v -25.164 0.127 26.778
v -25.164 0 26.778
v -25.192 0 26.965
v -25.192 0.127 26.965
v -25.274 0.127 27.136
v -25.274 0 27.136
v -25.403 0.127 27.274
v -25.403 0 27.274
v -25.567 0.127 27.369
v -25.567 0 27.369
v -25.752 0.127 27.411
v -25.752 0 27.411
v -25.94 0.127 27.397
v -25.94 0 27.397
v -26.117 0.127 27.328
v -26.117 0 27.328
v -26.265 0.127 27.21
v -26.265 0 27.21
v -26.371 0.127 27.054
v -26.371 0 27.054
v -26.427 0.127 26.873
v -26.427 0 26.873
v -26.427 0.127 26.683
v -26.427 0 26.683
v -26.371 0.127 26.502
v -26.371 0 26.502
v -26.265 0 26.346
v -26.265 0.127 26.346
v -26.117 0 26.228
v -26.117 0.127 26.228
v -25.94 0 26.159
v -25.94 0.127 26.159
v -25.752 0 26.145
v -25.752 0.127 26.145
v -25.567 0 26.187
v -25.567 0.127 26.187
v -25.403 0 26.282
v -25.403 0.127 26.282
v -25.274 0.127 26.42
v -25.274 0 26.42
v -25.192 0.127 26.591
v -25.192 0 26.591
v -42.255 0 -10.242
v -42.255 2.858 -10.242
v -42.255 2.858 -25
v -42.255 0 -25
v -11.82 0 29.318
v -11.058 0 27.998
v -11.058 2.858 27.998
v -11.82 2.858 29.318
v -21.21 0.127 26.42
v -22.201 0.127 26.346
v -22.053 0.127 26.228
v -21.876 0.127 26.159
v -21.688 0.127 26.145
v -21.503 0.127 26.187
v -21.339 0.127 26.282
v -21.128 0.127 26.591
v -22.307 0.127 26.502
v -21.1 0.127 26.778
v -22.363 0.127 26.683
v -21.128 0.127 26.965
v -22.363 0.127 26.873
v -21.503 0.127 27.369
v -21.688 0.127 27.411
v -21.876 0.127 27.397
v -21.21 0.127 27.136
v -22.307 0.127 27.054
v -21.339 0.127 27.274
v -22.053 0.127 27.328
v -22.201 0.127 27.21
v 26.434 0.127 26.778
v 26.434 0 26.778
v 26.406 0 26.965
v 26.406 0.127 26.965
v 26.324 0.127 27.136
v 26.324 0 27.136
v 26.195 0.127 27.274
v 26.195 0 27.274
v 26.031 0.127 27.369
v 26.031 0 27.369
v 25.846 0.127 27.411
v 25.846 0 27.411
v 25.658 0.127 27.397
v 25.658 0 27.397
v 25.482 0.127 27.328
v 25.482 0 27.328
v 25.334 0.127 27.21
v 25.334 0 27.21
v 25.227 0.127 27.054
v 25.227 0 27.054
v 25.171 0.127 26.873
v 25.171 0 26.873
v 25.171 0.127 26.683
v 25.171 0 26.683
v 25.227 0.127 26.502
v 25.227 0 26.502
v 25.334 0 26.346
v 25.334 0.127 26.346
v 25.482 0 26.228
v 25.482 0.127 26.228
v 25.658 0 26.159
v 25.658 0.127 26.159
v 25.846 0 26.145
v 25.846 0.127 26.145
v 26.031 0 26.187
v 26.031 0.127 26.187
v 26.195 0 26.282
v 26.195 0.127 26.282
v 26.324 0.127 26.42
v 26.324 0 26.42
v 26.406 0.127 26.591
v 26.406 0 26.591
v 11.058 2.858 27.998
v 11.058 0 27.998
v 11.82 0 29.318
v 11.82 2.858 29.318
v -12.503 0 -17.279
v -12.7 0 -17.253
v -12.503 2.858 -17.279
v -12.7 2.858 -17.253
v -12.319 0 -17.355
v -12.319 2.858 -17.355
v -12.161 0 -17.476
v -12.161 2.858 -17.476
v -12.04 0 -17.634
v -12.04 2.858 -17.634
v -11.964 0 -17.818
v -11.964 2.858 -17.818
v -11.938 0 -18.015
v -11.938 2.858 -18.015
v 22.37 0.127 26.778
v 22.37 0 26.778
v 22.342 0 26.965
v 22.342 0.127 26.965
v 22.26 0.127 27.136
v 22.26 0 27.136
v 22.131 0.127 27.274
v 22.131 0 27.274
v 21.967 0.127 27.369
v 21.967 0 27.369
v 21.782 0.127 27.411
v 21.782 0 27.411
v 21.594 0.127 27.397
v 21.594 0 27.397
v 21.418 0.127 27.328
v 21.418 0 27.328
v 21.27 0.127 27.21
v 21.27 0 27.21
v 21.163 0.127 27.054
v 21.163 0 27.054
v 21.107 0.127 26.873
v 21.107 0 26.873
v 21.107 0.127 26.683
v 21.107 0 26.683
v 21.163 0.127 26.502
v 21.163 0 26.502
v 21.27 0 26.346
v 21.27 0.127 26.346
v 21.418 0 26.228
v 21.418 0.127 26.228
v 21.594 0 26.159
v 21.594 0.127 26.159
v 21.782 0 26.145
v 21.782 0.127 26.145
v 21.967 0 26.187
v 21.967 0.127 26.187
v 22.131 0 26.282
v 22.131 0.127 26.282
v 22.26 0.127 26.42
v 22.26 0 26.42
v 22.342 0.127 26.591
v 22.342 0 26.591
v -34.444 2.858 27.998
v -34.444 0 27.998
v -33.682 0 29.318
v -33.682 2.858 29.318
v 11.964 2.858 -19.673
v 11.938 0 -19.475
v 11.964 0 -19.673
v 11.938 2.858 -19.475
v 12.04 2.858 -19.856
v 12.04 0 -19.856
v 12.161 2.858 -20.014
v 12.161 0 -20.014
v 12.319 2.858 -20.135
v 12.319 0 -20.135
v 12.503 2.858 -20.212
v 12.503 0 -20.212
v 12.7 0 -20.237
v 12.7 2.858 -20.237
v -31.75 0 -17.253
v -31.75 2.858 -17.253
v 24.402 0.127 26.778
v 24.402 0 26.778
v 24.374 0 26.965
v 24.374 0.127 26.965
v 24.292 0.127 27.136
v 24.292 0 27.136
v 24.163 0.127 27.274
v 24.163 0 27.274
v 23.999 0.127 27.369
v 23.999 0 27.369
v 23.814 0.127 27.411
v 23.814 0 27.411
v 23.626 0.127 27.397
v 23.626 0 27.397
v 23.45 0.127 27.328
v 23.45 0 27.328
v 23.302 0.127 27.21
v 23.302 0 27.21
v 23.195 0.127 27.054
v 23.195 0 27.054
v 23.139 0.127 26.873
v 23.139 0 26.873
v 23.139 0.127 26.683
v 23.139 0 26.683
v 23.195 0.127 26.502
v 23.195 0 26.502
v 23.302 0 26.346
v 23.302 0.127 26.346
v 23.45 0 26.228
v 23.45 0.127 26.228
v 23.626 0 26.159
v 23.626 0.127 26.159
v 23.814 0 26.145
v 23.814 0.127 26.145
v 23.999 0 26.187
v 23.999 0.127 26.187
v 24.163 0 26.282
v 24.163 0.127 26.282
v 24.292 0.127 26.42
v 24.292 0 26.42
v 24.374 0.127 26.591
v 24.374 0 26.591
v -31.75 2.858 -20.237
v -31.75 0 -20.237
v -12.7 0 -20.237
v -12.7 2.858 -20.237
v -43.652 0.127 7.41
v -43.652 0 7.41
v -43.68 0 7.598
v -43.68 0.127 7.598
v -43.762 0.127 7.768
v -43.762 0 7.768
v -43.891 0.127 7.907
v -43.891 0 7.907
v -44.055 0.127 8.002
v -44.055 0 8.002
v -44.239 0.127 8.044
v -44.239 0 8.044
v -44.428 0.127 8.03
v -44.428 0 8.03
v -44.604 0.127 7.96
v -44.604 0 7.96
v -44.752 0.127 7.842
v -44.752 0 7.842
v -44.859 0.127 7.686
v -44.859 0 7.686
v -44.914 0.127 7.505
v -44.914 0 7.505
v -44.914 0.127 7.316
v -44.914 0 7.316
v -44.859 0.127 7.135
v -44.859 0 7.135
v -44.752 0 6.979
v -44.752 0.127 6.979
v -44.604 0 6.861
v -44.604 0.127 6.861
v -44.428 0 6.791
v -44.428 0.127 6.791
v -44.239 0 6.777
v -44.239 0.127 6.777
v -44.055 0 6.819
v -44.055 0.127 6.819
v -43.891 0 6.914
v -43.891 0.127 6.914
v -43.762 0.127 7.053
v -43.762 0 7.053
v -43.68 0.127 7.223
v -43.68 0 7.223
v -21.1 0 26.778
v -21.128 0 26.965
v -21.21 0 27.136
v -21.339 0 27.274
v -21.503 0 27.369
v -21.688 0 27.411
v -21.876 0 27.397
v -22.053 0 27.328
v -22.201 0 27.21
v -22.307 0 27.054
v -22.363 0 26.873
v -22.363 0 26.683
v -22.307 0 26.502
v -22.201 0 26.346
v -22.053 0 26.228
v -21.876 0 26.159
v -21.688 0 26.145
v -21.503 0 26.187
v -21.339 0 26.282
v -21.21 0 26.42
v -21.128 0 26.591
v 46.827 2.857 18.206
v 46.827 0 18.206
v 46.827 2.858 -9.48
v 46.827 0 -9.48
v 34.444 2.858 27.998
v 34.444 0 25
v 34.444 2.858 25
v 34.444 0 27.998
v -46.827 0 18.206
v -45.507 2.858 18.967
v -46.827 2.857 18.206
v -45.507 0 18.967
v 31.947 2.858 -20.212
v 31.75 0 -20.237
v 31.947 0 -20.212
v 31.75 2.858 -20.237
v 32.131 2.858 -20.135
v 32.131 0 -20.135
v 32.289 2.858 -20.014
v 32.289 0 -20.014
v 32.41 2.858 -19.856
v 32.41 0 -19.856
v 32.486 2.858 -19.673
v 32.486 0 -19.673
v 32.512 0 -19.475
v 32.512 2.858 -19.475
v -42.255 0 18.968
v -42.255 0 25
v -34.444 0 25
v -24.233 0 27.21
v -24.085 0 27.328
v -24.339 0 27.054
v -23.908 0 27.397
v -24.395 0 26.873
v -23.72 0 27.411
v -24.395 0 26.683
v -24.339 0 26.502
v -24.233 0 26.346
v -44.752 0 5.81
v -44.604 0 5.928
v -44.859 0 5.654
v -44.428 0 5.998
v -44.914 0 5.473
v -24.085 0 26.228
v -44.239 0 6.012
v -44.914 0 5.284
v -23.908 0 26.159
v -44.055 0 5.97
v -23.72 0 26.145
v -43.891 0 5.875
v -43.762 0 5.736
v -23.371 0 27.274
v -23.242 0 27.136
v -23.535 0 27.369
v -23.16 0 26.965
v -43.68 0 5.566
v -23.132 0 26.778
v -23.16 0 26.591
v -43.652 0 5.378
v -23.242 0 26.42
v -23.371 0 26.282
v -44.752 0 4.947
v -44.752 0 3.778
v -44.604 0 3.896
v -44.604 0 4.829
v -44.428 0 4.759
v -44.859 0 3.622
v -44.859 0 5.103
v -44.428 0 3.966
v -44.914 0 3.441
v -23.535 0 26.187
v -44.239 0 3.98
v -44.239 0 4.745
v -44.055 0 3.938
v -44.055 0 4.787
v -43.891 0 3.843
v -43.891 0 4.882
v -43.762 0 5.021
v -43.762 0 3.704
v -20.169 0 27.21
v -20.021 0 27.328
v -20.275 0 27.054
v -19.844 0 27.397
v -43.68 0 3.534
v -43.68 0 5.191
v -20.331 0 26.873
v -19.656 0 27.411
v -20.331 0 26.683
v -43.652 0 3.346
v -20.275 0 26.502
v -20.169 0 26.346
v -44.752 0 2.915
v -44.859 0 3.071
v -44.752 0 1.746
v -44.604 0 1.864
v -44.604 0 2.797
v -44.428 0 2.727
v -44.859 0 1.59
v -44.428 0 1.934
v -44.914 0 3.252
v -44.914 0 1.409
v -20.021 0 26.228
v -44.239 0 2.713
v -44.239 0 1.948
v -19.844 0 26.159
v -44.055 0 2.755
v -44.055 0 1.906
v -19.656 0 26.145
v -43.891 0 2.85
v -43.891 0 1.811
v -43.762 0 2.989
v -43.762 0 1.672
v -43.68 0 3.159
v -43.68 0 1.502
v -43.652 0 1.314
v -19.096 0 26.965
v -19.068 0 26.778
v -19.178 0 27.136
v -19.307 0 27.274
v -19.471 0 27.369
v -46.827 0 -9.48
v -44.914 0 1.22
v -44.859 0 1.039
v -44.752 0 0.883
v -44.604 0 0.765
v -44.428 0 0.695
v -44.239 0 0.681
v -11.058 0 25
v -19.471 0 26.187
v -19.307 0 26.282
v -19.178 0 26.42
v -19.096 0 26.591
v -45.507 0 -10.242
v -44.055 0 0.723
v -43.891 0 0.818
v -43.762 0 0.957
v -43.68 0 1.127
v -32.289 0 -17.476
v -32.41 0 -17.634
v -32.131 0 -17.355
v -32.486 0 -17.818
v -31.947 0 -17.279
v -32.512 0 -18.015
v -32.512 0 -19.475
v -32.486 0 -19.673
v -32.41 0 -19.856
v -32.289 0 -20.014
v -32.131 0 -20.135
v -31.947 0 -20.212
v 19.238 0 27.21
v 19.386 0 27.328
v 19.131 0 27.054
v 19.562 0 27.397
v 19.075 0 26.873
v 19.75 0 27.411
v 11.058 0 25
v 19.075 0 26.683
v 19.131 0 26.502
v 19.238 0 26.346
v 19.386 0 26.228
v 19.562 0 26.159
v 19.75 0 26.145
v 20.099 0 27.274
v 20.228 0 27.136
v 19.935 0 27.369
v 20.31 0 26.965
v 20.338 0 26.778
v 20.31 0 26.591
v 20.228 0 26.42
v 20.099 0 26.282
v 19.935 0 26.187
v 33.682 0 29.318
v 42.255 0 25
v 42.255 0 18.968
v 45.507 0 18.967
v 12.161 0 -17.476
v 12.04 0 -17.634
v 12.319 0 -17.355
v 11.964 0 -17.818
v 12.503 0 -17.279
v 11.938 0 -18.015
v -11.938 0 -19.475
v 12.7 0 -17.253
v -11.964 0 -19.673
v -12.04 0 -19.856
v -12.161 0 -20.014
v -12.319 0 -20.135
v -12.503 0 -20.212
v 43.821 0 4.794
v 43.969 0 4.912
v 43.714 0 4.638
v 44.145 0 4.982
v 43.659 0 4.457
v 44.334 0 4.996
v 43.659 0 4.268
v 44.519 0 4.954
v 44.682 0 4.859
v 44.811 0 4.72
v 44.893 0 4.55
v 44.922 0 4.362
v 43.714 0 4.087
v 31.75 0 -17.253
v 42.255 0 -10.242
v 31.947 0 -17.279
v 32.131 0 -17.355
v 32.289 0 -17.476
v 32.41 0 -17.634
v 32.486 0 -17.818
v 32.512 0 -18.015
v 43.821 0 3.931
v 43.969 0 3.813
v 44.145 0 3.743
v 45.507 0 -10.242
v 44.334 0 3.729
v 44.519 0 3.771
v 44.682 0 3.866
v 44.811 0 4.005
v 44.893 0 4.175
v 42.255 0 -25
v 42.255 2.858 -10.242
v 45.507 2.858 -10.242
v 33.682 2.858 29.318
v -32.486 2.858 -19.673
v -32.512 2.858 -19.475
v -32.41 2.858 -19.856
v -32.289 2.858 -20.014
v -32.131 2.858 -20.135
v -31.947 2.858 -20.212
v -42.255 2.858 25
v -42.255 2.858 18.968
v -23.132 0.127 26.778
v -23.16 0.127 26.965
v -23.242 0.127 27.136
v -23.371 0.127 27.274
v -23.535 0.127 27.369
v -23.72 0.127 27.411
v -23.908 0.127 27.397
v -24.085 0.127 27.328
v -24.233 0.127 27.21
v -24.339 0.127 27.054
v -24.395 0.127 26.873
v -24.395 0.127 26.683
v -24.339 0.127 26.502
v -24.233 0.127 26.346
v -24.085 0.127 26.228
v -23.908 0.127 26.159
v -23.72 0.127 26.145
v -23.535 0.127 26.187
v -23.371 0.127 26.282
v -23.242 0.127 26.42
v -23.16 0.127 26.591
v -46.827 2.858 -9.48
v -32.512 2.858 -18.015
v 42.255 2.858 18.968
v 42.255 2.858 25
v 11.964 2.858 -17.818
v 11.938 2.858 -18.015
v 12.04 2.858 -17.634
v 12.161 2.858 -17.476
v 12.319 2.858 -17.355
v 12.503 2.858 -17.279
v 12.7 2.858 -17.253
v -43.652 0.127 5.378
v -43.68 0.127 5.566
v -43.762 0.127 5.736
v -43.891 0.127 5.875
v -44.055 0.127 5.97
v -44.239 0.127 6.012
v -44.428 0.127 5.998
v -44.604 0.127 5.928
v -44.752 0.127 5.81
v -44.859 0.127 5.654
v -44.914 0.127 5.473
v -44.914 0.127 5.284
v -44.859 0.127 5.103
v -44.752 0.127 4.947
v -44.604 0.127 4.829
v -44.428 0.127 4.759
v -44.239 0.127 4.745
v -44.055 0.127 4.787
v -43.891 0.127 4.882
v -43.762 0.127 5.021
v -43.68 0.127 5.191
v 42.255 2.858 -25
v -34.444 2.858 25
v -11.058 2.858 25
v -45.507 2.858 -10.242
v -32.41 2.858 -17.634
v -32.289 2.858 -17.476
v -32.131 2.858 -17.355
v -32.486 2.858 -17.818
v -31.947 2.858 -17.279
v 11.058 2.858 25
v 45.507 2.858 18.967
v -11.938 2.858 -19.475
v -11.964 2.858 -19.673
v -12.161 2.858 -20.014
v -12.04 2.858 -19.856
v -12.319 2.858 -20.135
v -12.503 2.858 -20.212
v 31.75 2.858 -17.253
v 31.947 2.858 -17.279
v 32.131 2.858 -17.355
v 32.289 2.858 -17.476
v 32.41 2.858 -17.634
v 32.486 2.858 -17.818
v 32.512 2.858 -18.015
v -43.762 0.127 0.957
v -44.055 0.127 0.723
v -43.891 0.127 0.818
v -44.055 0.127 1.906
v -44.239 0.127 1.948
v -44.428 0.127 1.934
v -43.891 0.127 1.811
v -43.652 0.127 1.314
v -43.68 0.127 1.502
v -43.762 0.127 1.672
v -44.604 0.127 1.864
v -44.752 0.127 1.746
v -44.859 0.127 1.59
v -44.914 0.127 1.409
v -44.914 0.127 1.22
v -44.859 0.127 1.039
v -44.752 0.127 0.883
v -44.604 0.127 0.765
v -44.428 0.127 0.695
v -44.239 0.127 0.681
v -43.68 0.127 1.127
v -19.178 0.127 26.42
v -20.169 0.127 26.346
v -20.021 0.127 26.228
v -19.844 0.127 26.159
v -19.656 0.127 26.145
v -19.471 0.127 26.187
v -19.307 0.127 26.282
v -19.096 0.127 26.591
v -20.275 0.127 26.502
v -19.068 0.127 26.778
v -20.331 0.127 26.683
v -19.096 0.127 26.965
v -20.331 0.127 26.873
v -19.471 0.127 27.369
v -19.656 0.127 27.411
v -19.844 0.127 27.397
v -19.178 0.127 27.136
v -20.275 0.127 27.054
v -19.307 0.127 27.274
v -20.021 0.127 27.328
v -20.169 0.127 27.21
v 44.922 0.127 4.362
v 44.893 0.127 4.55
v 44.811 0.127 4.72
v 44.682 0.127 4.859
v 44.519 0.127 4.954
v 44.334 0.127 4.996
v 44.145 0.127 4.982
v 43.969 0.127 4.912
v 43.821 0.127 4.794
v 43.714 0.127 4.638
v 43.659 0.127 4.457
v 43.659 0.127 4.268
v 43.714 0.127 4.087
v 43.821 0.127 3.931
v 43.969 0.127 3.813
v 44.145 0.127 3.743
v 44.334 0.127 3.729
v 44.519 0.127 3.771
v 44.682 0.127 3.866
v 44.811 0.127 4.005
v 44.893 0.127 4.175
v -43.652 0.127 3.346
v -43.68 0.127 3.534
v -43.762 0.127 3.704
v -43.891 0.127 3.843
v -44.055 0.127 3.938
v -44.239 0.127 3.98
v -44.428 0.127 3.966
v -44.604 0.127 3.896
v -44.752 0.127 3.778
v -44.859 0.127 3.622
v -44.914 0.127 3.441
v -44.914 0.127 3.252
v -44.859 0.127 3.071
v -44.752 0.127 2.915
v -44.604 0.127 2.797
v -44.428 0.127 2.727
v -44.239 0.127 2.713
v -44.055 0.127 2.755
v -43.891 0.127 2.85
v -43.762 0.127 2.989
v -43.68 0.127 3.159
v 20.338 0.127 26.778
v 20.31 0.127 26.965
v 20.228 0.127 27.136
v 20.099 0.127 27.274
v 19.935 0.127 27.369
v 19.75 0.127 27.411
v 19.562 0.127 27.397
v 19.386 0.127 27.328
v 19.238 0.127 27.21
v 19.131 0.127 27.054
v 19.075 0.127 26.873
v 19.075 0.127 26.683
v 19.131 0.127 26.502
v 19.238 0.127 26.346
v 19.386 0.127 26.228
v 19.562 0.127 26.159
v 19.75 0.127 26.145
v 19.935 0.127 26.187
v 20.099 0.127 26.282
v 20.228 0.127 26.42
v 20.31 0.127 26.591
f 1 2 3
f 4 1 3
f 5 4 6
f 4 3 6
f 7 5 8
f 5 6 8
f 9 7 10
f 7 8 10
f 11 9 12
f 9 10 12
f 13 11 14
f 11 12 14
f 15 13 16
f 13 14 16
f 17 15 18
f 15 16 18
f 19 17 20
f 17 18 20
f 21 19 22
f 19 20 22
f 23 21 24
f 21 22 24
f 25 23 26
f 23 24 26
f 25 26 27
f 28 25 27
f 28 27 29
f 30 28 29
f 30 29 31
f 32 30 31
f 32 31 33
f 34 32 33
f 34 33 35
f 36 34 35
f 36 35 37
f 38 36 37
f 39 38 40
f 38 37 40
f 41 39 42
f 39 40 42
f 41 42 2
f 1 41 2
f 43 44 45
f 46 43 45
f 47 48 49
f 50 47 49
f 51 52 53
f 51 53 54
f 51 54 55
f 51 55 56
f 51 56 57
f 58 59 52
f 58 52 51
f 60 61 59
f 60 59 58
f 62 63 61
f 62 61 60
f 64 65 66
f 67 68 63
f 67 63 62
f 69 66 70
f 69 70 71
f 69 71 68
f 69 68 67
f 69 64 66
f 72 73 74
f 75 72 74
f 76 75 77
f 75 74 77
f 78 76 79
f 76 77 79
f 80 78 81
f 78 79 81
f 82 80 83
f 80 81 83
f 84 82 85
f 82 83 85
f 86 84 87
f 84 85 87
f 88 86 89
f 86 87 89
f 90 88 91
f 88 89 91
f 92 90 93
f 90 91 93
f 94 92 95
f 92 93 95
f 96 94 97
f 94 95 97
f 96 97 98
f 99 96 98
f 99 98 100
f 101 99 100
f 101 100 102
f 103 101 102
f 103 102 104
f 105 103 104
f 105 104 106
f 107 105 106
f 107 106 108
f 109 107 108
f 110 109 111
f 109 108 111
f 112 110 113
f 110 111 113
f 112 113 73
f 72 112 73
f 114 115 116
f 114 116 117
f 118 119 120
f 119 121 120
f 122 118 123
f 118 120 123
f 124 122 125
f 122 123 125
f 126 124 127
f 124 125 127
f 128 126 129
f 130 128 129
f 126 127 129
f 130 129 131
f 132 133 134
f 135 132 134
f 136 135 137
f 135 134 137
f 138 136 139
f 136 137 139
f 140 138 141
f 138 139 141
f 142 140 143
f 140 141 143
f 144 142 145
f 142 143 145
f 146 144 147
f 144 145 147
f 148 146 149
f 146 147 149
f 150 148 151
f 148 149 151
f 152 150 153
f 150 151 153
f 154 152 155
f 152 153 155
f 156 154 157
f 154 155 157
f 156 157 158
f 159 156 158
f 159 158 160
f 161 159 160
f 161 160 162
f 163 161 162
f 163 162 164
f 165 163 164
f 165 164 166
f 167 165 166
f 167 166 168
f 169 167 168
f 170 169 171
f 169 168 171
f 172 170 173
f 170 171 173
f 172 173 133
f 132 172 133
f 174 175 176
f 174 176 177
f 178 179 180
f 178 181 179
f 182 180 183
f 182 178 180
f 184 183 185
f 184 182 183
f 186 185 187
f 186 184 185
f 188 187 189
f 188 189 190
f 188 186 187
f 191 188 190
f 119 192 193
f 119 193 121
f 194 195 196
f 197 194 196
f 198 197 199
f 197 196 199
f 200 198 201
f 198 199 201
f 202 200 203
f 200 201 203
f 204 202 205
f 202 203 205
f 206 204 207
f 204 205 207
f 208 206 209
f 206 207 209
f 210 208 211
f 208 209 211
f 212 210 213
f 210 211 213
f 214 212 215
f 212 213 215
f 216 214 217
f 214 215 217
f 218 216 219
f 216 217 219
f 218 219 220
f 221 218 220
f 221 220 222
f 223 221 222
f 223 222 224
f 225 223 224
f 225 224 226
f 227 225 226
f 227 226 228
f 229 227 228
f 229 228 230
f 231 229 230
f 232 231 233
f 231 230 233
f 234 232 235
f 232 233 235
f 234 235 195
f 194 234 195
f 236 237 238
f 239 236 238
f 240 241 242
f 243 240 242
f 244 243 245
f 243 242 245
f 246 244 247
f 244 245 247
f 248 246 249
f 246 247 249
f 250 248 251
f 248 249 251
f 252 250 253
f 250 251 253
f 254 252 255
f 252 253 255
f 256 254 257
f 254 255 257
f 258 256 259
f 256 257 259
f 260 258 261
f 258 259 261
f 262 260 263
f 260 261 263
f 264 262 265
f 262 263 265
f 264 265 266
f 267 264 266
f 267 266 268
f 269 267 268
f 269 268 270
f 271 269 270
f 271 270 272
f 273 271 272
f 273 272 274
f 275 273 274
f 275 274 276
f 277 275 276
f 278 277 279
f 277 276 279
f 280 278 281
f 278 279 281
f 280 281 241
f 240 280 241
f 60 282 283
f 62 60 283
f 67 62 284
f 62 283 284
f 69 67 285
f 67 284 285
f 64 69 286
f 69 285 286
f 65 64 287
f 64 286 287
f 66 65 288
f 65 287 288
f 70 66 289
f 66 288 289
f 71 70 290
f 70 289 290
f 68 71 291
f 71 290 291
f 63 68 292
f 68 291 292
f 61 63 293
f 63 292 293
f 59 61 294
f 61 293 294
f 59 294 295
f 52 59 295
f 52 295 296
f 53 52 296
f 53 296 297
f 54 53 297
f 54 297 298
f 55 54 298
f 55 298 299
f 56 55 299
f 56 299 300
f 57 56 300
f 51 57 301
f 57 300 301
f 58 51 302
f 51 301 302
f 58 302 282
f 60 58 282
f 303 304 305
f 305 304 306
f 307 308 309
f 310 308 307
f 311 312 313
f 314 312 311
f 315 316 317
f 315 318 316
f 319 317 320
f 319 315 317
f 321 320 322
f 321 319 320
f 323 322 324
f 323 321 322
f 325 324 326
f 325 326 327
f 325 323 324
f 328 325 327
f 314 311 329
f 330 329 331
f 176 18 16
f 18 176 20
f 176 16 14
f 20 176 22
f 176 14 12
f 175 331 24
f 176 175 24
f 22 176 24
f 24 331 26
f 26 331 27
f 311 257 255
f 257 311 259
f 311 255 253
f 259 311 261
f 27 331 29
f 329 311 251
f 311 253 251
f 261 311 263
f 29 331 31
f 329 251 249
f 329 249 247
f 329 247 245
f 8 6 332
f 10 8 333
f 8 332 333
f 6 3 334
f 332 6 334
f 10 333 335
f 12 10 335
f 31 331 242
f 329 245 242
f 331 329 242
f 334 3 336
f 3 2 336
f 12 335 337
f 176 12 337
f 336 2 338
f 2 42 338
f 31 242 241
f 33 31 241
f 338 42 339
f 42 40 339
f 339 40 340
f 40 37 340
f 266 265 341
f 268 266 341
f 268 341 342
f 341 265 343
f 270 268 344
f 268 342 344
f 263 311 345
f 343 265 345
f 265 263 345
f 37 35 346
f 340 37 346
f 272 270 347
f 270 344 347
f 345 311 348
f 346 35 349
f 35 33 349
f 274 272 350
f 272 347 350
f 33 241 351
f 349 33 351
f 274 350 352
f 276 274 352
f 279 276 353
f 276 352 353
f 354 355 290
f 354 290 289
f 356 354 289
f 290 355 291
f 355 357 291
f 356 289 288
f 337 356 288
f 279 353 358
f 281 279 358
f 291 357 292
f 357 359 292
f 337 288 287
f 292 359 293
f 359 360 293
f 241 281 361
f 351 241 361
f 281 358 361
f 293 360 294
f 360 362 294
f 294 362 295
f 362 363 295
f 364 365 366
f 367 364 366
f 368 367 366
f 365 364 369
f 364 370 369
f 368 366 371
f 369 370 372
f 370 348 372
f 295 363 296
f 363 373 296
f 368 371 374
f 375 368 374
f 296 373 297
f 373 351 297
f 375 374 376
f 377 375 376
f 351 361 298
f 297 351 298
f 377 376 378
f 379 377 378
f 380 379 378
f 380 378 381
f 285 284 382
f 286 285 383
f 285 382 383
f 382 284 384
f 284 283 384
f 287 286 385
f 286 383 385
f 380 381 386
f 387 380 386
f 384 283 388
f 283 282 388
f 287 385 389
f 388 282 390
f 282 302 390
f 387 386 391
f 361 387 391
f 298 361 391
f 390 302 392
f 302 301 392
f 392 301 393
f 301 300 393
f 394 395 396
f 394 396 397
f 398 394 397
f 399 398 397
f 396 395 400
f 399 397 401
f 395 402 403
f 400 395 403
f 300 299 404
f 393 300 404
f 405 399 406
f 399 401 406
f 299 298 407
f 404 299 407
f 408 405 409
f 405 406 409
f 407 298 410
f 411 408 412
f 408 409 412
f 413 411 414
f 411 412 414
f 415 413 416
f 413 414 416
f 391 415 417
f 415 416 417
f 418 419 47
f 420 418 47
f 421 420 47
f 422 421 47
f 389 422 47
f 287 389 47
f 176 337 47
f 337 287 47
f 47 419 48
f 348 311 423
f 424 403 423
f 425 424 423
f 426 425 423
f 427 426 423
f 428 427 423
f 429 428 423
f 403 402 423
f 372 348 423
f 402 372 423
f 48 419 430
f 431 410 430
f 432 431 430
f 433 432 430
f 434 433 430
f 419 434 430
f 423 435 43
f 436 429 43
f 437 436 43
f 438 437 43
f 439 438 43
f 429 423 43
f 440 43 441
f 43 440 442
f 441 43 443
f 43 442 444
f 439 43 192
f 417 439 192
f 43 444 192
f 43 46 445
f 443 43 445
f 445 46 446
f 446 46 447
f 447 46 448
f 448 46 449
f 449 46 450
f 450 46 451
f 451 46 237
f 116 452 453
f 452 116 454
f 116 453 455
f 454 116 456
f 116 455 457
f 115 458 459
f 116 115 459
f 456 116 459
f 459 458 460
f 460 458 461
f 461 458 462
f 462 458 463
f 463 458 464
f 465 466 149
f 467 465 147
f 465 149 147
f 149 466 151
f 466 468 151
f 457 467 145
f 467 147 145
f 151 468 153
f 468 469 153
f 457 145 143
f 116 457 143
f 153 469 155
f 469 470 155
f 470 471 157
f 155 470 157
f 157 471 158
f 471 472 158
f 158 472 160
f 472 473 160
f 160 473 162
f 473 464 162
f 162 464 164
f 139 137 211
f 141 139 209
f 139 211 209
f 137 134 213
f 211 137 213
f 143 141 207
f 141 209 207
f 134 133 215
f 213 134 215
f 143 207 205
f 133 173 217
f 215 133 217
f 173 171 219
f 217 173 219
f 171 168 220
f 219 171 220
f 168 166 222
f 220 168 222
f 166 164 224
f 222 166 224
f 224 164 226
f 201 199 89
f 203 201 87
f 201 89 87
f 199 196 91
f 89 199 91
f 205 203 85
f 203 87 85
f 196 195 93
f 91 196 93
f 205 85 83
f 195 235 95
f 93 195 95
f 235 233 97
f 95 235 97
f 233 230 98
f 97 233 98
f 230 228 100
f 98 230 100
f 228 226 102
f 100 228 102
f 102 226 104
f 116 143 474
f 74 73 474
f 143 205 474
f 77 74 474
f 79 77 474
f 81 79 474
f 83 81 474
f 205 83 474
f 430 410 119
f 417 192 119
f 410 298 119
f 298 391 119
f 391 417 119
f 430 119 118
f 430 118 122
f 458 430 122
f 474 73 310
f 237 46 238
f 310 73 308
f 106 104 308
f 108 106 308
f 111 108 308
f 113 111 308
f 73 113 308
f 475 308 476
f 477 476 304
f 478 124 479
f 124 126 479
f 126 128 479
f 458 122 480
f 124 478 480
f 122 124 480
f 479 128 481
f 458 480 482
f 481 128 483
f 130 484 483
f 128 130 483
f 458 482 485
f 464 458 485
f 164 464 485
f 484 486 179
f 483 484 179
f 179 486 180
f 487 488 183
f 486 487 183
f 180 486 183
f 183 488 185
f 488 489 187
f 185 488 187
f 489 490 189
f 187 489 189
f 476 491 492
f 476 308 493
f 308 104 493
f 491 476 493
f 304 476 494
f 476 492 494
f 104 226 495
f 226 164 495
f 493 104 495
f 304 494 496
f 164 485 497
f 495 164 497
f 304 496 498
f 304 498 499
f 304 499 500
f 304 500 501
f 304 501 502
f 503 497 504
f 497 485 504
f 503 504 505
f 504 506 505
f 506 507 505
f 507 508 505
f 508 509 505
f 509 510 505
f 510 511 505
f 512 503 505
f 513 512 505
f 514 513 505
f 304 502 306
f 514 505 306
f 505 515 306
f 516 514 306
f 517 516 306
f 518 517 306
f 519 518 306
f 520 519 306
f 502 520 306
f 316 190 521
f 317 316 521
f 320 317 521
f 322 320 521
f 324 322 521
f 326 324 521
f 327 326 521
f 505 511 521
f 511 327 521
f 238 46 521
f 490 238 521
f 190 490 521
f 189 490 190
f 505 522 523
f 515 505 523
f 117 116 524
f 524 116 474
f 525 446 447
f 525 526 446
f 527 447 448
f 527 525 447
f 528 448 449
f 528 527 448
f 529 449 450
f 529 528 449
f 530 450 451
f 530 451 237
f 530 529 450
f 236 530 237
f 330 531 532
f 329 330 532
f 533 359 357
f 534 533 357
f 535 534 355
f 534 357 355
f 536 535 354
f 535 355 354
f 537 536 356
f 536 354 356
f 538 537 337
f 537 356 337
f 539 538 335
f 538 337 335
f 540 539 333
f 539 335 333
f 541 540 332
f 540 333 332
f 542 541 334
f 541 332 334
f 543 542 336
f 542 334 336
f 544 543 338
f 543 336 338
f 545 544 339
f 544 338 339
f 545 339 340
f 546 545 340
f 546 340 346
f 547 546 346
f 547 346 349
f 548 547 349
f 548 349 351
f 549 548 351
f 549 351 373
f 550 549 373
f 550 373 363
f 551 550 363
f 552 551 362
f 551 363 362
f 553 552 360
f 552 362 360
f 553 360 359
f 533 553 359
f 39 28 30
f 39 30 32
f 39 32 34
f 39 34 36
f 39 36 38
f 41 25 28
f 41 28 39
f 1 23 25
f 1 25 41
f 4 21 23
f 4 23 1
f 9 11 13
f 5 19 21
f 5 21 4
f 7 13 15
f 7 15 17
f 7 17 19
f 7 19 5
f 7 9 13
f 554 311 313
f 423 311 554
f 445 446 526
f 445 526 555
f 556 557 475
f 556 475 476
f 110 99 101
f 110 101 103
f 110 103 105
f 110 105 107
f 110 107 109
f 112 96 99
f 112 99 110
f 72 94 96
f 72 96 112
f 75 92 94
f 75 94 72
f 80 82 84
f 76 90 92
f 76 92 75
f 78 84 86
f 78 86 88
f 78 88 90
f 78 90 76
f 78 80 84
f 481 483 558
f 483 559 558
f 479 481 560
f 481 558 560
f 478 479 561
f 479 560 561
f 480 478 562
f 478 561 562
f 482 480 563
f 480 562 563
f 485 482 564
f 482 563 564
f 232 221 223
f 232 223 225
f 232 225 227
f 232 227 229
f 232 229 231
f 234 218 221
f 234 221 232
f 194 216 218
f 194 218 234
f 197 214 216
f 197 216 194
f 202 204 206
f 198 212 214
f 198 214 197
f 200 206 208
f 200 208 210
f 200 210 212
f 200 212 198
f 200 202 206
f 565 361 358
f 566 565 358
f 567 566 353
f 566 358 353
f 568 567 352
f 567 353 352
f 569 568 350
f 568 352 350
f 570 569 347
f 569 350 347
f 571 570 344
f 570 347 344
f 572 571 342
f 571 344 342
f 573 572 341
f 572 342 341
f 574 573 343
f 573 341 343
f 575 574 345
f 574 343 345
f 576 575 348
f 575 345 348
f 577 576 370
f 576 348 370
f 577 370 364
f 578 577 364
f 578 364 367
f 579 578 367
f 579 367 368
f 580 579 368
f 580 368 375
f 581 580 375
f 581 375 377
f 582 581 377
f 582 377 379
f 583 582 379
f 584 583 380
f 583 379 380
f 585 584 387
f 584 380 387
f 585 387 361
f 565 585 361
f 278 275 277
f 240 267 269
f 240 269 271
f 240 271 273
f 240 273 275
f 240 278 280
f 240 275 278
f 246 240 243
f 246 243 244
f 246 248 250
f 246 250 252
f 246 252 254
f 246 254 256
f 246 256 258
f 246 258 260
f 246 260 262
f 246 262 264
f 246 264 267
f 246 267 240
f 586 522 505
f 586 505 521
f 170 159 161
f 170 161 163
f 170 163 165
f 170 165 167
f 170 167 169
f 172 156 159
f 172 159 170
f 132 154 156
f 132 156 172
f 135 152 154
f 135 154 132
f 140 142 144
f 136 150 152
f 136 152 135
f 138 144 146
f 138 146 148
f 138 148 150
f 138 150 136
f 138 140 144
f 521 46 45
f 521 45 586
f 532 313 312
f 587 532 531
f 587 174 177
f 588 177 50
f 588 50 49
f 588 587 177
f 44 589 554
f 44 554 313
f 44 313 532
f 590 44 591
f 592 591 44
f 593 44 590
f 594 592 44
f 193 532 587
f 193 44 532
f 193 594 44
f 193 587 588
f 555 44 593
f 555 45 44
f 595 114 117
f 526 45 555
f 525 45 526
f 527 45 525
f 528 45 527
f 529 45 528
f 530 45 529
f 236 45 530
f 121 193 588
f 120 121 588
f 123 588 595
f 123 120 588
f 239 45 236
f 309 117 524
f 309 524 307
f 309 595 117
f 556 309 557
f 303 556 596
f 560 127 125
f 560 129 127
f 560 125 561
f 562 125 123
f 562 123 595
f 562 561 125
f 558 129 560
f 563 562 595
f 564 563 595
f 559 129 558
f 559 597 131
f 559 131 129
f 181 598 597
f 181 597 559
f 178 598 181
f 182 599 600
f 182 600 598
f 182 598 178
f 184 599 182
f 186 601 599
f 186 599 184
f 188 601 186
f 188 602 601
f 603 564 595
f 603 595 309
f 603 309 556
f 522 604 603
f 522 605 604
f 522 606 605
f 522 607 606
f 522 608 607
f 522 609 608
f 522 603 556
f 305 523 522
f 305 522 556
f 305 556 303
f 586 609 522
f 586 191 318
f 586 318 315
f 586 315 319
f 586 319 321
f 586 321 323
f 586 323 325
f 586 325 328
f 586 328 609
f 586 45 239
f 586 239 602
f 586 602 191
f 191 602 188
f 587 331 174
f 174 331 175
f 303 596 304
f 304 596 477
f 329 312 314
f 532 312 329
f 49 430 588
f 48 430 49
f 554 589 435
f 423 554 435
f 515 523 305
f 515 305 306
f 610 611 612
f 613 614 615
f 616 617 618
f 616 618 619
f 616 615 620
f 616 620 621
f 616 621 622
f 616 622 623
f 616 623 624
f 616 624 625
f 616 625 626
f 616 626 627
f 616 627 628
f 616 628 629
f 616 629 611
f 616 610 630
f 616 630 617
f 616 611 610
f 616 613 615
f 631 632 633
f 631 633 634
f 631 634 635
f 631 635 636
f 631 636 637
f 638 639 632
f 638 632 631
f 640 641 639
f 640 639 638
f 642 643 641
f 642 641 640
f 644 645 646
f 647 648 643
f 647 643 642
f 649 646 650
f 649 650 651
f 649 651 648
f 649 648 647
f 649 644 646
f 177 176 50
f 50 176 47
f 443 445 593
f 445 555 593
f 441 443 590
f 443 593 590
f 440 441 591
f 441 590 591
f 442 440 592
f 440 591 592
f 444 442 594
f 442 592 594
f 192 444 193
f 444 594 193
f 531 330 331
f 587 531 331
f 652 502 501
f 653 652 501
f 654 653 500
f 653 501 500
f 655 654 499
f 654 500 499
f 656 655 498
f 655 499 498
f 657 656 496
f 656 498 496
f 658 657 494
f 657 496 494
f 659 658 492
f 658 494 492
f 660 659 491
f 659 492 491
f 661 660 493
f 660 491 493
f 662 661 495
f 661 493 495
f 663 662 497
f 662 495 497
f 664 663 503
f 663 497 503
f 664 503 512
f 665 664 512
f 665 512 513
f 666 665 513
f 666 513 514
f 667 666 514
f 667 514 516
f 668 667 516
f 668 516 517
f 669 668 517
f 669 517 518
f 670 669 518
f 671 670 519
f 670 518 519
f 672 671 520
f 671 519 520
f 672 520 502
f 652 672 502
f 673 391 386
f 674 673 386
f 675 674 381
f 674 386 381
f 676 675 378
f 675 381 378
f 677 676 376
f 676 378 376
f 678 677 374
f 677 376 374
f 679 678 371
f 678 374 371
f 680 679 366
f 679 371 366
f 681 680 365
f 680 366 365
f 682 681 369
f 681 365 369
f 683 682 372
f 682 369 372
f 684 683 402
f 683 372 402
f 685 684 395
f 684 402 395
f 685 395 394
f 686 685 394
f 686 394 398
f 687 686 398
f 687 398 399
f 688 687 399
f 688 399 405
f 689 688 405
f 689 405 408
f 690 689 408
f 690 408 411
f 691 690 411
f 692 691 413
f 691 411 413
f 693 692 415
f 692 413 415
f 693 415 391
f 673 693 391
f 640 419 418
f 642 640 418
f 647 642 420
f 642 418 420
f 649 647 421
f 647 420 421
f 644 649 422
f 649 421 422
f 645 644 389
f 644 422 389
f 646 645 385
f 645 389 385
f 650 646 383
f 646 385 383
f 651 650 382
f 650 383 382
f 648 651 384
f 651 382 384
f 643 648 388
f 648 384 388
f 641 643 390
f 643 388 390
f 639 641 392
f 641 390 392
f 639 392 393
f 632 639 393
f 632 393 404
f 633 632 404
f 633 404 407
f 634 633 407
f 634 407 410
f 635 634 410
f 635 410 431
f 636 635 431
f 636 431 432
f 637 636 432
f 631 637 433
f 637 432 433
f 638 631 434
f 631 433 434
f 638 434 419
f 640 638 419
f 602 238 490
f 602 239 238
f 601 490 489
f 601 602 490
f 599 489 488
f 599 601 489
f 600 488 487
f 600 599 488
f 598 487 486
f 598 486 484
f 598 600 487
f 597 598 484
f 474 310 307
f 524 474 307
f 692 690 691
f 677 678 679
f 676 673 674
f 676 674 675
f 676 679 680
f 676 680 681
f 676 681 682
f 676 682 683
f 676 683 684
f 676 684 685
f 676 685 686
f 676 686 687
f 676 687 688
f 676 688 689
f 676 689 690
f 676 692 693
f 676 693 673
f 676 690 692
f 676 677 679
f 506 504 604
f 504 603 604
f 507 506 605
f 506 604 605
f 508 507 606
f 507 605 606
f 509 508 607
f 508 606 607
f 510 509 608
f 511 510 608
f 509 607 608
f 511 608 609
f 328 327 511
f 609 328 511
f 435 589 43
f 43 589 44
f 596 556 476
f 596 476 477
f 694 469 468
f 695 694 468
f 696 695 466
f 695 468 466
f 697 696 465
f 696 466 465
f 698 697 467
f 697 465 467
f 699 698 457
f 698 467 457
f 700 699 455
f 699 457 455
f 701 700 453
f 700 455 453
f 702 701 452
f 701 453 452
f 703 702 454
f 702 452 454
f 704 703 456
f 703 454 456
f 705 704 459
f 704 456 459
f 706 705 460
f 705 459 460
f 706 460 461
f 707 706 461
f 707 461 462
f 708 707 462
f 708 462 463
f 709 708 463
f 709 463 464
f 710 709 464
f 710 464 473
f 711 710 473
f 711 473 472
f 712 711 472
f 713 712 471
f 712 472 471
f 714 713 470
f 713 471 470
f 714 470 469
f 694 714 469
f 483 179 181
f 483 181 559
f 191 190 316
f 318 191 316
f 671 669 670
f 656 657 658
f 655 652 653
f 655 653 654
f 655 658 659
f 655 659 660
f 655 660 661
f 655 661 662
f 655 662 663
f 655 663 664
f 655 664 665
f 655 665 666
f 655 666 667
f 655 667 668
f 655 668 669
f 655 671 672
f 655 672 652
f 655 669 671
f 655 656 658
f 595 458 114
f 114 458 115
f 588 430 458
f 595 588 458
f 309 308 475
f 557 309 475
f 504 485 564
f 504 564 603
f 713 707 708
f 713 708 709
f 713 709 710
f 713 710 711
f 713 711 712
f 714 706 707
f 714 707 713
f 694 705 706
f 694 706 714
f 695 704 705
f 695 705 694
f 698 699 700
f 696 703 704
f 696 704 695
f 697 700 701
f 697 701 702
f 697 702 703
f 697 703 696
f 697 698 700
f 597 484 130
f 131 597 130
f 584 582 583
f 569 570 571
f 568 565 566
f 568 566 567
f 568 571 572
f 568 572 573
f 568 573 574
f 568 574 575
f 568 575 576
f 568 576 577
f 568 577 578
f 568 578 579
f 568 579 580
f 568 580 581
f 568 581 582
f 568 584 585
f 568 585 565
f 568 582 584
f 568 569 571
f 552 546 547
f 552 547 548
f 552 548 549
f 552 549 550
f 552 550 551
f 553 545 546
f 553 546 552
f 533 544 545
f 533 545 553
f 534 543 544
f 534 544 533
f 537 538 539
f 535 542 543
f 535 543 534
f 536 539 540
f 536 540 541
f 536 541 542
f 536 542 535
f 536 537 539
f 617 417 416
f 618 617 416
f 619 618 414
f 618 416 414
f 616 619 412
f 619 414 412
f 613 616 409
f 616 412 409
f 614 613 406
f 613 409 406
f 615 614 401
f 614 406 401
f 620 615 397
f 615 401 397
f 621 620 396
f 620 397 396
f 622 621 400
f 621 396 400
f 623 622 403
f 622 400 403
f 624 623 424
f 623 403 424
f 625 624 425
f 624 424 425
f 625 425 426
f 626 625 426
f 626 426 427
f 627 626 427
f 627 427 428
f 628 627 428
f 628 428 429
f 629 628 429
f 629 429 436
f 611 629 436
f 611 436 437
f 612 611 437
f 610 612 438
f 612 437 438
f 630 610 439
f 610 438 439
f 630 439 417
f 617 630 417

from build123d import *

# Parameters (mm, degrees)
SKETCH1_W             = 93.653112922
SKETCH1_H             = 50
BOSS_EXTRUDE1_DEPTH   = 2.8575
SKETCH3_W             = 23.386037641
SKETCH3_H             = 4.318
BOSS_EXTRUDE2_DEPTH   = 2.8575
CUT_EXTRUDE1_REACH    = 4.857
SKETCH4_W             = 4.572
SKETCH4_H             = 14.7575
SKETCH4_H_2           = 6.0325
CUT_EXTRUDE2_REACH    = 4.857
SKETCH5_W             = 20.574
SKETCH5_H             = 2.9845
SKETCH6_R             = 0.635
CUT_EXTRUDE3_DEPTH    = 0.127
CHAMFER1_SIZE         = 0.762
CHAMFER1_SIZE2        = 1.319822715
CHAMFER1_PART_2_SIZE  = 0.762
CHAMFER1_PART_2_SIZE2 = 1.319822715
CHAMFER1_PART_3_SIZE  = 0.762
CHAMFER1_PART_3_SIZE2 = 1.319822715
CHAMFER1_PART_4_SIZE  = 0.762
CHAMFER1_PART_4_SIZE2 = 1.319822715
CHAMFER2_SIZE         = 0.762
CHAMFER2_SIZE2        = 1.319822715
CHAMFER2_PART_2_SIZE  = 0.762
CHAMFER2_PART_2_SIZE2 = 1.319822715
CHAMFER2_PART_3_SIZE  = 0.762
CHAMFER2_PART_3_SIZE2 = 1.319822715
CHAMFER2_PART_4_SIZE  = 0.762
CHAMFER2_PART_4_SIZE2 = 1.319822715
FILLET1_R             = 0.762


with BuildPart() as part:
    # Sketch1 → Boss-Extrude1 (new body)
    with BuildSketch(Plane(origin=(0, 0, 0), x_dir=(1, 0, 0), z_dir=(0, 1, 0))):
        Rectangle(SKETCH1_W, SKETCH1_H)
    extrude(amount=BOSS_EXTRUDE1_DEPTH)

    # Sketch3 → Boss-Extrude2 (add)
    with BuildSketch(Plane.XZ):
        with Locations((-22.751037641, 27.159)):
            Rectangle(SKETCH3_W, SKETCH3_H)
        with Locations((22.751037641, 27.159)):
            Rectangle(SKETCH3_W, SKETCH3_H)
    extrude(amount=-BOSS_EXTRUDE2_DEPTH)

    # Sketch4 → Cut-Extrude1 (cut, up to next)
    with BuildSketch(Plane(origin=(0, 2.8575, 0), x_dir=(1, 0, 0), z_dir=(0, 1, 0)), mode=Mode.PRIVATE) as cut_extrude1_sk1:
        with Locations((44.540556461, 17.62125)):
            Rectangle(SKETCH4_W, SKETCH4_H)
    cut_extrude1_tool1 = extrude(cut_extrude1_sk1.sketch, amount=-CUT_EXTRUDE1_REACH, mode=Mode.PRIVATE) & part.part
    add(cut_extrude1_tool1.solids().sort_by_distance((44.540556, 2.8575, -17.62125))[0], mode=Mode.SUBTRACT)
    # Sketch4 → Cut-Extrude1 (cut, up to next)
    with BuildSketch(Plane(origin=(0, 2.8575, 0), x_dir=(1, 0, 0), z_dir=(0, 1, 0)), mode=Mode.PRIVATE) as cut_extrude1_sk2:
        with Locations((44.540556461, -21.98375)):
            Rectangle(SKETCH4_W, SKETCH4_H_2)
    cut_extrude1_tool2 = extrude(cut_extrude1_sk2.sketch, amount=-CUT_EXTRUDE1_REACH, mode=Mode.PRIVATE) & part.part
    add(cut_extrude1_tool2.solids().sort_by_distance((44.540556, 2.8575, 21.98375))[0], mode=Mode.SUBTRACT)
    # Sketch4 → Cut-Extrude1 (cut, up to next)
    with BuildSketch(Plane(origin=(0, 2.8575, 0), x_dir=(1, 0, 0), z_dir=(0, 1, 0)), mode=Mode.PRIVATE) as cut_extrude1_sk3:
        with Locations((-44.540556461, 17.62125)):
            Rectangle(SKETCH4_W, SKETCH4_H)
    cut_extrude1_tool3 = extrude(cut_extrude1_sk3.sketch, amount=-CUT_EXTRUDE1_REACH, mode=Mode.PRIVATE) & part.part
    add(cut_extrude1_tool3.solids().sort_by_distance((-44.540556, 2.8575, -17.62125))[0], mode=Mode.SUBTRACT)
    # Sketch4 → Cut-Extrude1 (cut, up to next)
    with BuildSketch(Plane(origin=(0, 2.8575, 0), x_dir=(1, 0, 0), z_dir=(0, 1, 0)), mode=Mode.PRIVATE) as cut_extrude1_sk4:
        with Locations((-44.540556461, -21.98375)):
            Rectangle(SKETCH4_W, SKETCH4_H_2)
    cut_extrude1_tool4 = extrude(cut_extrude1_sk4.sketch, amount=-CUT_EXTRUDE1_REACH, mode=Mode.PRIVATE) & part.part
    add(cut_extrude1_tool4.solids().sort_by_distance((-44.540556, 2.8575, 21.98375))[0], mode=Mode.SUBTRACT)

    # Sketch5 → Cut-Extrude2 (cut, up to next)
    with BuildSketch(Plane.XZ, mode=Mode.PRIVATE) as cut_extrude2_sk1:
        with Locations((22.225, -18.74525)):
            Rectangle(SKETCH5_W, SKETCH5_H)
    cut_extrude2_tool1 = extrude(cut_extrude2_sk1.sketch, amount=-CUT_EXTRUDE2_REACH, mode=Mode.PRIVATE) & part.part
    add(cut_extrude2_tool1.solids().sort_by_distance((22.225, 0, -18.74525))[0], mode=Mode.SUBTRACT)
    # Sketch5 → Cut-Extrude2 (cut, up to next)
    with BuildSketch(Plane.XZ, mode=Mode.PRIVATE) as cut_extrude2_sk2:
        with Locations((-22.225, -18.74525)):
            Rectangle(SKETCH5_W, SKETCH5_H)
    cut_extrude2_tool2 = extrude(cut_extrude2_sk2.sketch, amount=-CUT_EXTRUDE2_REACH, mode=Mode.PRIVATE) & part.part
    add(cut_extrude2_tool2.solids().sort_by_distance((-22.225, 0, -18.74525))[0], mode=Mode.SUBTRACT)

    # Sketch6 → Cut-Extrude3 (cut)
    with BuildSketch(Plane.XZ):
        with Locations((-25.799037641, 26.778)):
            Circle(SKETCH6_R)
        with Locations((-23.767037641, 26.778)):
            Circle(SKETCH6_R)
        with Locations((-21.735037641, 26.778)):
            Circle(SKETCH6_R)
        with Locations((-19.703037641, 26.778)):
            Circle(SKETCH6_R)
        with Locations((19.703037641, 26.778)):
            Circle(SKETCH6_R)
        with Locations((21.735037641, 26.778)):
            Circle(SKETCH6_R)
        with Locations((23.767037641, 26.778)):
            Circle(SKETCH6_R)
        with Locations((25.799037641, 26.778)):
            Circle(SKETCH6_R)
        with Locations((44.286556461, 4.3625)):
            Circle(SKETCH6_R)
        with Locations((-44.286556461, 7.4105)):
            Circle(SKETCH6_R)
        with Locations((-44.286556461, 5.3785)):
            Circle(SKETCH6_R)
        with Locations((-44.286556461, 3.3465)):
            Circle(SKETCH6_R)
        with Locations((-44.286556461, 1.3145)):
            Circle(SKETCH6_R)
    extrude(amount=-CUT_EXTRUDE3_DEPTH, mode=Mode.SUBTRACT)

    # Chamfer1
    chamfer1_edges = [part.edges().sort_by_distance(p)[0] for p in [
        (-34.444056461, 1.42875, 29.318),
    ]]
    chamfer1_side = [part.faces().sort_by_distance(p)[0] for p in [
        (-22.751037641, 1.42875, 29.318),
    ]]
    chamfer(chamfer1_edges, length=CHAMFER1_SIZE, length2=CHAMFER1_SIZE2, reference=chamfer1_side[0])

    # Chamfer1 part 2
    chamfer1_part_2_edges = [part.edges().sort_by_distance(p)[0] for p in [
        (11.05801882, 1.42875, 29.318),
    ]]
    chamfer1_part_2_side = [part.faces().sort_by_distance(p)[0] for p in [
        (22.751037641, 1.42875, 29.318),
    ]]
    chamfer(chamfer1_part_2_edges, length=CHAMFER1_PART_2_SIZE, length2=CHAMFER1_PART_2_SIZE2, reference=chamfer1_part_2_side[0])

    # Chamfer1 part 3
    chamfer1_part_3_edges = [part.edges().sort_by_distance(p)[0] for p in [
        (-46.826556461, 1.42875, 18.9675),
    ]]
    chamfer1_part_3_side = [part.faces().sort_by_distance(p)[0] for p in [
        (-46.826556461, 1.42875, 4.3625),
    ]]
    chamfer(chamfer1_part_3_edges, length=CHAMFER1_PART_3_SIZE, length2=CHAMFER1_PART_3_SIZE2, reference=chamfer1_part_3_side[0])

    # Chamfer1 part 4
    chamfer1_part_4_edges = [part.edges().sort_by_distance(p)[0] for p in [
        (46.826556461, 1.42875, -10.2425),
    ]]
    chamfer1_part_4_side = [part.faces().sort_by_distance(p)[0] for p in [
        (46.826556461, 1.42875, 4.3625),
    ]]
    chamfer(chamfer1_part_4_edges, length=CHAMFER1_PART_4_SIZE, length2=CHAMFER1_PART_4_SIZE2, reference=chamfer1_part_4_side[0])

    # Chamfer2
    chamfer2_edges = [part.edges().sort_by_distance(p)[0] for p in [
        (-11.05801882, 1.42875, 29.318),
    ]]
    chamfer2_side = [part.faces().sort_by_distance(p)[0] for p in [
        (-22.370037641, 1.42875, 29.318),
    ]]
    chamfer(chamfer2_edges, length=CHAMFER2_SIZE, length2=CHAMFER2_SIZE2, reference=chamfer2_side[0])

    # Chamfer2 part 2
    chamfer2_part_2_edges = [part.edges().sort_by_distance(p)[0] for p in [
        (34.444056461, 1.42875, 29.318),
    ]]
    chamfer2_part_2_side = [part.faces().sort_by_distance(p)[0] for p in [
        (23.132037641, 1.42875, 29.318),
    ]]
    chamfer(chamfer2_part_2_edges, length=CHAMFER2_PART_2_SIZE, length2=CHAMFER2_PART_2_SIZE2, reference=chamfer2_part_2_side[0])

    # Chamfer2 part 3
    chamfer2_part_3_edges = [part.edges().sort_by_distance(p)[0] for p in [
        (46.826556461, 1.42875, 18.9675),
    ]]
    chamfer2_part_3_side = [part.faces().sort_by_distance(p)[0] for p in [
        (46.826556461, 1.42875, 4.7435),
    ]]
    chamfer(chamfer2_part_3_edges, length=CHAMFER2_PART_3_SIZE, length2=CHAMFER2_PART_3_SIZE2, reference=chamfer2_part_3_side[0])

    # Chamfer2 part 4
    chamfer2_part_4_edges = [part.edges().sort_by_distance(p)[0] for p in [
        (-46.826556461, 1.42875, -10.2425),
    ]]
    chamfer2_part_4_side = [part.faces().sort_by_distance(p)[0] for p in [
        (-46.826556461, 1.42875, 3.9815),
    ]]
    chamfer(chamfer2_part_4_edges, length=CHAMFER2_PART_4_SIZE, length2=CHAMFER2_PART_4_SIZE2, reference=chamfer2_part_4_side[0])

    # Fillet1
    fillet1_edges = [part.edges().sort_by_distance(p)[0] for p in [
        (11.938, 1.42875, -20.2375),
        (11.938, 1.42875, -17.253),
        (32.512, 1.42875, -17.253),
        (32.512, 1.42875, -20.2375),
        (-32.512, 1.42875, -20.2375),
        (-32.512, 1.42875, -17.253),
        (-11.938, 1.42875, -17.253),
        (-11.938, 1.42875, -20.2375),
    ]]
    fillet(fillet1_edges, radius=FILLET1_R)


solid = part.part
